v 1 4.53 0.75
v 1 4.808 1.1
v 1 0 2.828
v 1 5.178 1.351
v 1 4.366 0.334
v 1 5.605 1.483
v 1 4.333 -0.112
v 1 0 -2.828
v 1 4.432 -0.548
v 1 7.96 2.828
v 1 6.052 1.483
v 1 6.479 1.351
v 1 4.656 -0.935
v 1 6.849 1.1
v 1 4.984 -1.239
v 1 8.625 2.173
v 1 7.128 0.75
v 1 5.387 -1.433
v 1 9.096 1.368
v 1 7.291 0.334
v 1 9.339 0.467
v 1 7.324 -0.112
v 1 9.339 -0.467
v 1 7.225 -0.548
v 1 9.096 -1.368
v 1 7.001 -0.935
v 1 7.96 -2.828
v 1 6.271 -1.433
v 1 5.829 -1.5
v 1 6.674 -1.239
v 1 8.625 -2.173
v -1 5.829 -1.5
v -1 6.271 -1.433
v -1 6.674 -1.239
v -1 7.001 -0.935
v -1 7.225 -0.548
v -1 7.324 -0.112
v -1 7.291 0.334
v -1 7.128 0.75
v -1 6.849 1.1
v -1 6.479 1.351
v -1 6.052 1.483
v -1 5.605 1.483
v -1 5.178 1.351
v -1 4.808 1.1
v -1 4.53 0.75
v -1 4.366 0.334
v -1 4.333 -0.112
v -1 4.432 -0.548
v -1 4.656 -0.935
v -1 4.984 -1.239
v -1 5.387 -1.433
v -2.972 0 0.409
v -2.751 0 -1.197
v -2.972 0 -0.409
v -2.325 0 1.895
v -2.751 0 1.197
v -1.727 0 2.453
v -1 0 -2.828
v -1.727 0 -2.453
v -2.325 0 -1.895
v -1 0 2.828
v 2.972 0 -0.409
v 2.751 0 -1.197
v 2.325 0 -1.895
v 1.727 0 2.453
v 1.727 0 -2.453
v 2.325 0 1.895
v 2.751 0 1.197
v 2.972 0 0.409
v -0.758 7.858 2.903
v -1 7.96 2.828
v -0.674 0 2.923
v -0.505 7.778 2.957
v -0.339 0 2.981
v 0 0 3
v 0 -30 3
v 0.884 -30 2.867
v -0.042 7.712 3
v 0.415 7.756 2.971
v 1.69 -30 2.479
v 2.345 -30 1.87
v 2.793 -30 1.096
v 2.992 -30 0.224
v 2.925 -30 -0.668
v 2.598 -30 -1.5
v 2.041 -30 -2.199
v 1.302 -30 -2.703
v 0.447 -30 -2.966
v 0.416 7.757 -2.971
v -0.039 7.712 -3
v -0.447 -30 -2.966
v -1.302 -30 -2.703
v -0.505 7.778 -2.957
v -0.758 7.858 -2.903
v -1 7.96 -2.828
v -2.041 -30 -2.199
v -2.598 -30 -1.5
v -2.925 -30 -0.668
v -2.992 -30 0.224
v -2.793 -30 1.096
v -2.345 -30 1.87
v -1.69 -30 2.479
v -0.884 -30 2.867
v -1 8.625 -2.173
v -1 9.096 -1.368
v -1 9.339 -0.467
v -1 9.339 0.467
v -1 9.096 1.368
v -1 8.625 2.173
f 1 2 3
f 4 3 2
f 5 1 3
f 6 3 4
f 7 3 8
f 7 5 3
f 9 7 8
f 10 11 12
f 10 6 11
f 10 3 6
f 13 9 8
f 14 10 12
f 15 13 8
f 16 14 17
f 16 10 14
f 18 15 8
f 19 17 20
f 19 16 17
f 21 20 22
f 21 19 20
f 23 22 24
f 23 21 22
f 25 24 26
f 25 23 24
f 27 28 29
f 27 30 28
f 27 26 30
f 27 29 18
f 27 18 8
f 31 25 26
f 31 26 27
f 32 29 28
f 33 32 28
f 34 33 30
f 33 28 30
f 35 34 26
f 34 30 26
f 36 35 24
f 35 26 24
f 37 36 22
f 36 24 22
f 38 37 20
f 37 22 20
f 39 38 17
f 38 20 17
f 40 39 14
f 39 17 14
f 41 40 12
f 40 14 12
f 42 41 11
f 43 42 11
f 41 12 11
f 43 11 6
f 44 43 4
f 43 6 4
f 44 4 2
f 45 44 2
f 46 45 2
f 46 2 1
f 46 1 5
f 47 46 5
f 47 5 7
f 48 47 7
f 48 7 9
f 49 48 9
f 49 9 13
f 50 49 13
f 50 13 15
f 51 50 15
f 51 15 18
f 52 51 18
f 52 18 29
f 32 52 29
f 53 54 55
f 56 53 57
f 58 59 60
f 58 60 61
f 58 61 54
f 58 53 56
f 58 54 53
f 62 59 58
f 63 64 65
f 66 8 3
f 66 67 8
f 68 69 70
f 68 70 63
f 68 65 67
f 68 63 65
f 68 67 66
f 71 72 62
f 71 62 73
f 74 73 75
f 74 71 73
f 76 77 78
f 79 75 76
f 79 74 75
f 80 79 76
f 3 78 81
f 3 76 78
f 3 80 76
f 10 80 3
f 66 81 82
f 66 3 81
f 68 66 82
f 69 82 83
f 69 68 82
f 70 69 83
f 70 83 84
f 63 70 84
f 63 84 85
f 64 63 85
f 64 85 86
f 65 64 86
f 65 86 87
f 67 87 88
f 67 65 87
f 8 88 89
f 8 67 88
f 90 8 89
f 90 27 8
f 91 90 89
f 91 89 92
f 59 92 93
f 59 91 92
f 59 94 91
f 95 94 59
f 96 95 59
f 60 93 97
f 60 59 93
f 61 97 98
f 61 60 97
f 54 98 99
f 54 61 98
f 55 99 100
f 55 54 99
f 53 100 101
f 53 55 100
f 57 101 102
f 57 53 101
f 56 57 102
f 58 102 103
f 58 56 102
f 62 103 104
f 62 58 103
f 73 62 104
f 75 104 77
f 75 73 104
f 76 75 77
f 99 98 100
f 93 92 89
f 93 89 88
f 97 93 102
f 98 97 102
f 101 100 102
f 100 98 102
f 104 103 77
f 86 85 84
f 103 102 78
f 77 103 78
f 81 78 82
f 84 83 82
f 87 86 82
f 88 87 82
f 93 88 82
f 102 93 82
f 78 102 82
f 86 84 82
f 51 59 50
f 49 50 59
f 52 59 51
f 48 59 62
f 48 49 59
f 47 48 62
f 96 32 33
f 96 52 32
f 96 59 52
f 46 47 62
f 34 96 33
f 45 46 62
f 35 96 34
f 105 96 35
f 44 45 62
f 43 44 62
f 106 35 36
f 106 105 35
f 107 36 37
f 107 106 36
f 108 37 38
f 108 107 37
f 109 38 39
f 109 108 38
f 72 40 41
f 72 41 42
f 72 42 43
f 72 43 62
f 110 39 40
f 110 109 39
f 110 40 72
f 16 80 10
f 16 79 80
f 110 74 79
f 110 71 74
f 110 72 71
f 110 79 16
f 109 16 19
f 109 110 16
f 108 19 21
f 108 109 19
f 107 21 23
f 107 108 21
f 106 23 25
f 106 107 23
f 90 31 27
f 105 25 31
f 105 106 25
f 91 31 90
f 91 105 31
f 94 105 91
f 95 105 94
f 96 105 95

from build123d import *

# Parameters (mm, degrees)
SKETCH1_R               = 3
BOSS_EXTRUDE1_DEPTH     = 30
BOSS_EXTRUDE2_START     = 10
BOSS_EXTRUDE2_DEPTH     = 10
SKETCH2_R               = 1.5
CUT_EXTRUDE1_DEPTH      = 10
CUT_EXTRUDE2_DEPTH      = 31.413812651
CUT_EXTRUDE2_DEPTH_BACK = 31.413812651


with BuildPart() as part:
    # Sketch1 → Boss-Extrude1 (new body)
    with BuildSketch(Plane(origin=(0, 0, 0), x_dir=(1, 0, 0), z_dir=(0, 1, 0))):
        Circle(SKETCH1_R)
    extrude(amount=-BOSS_EXTRUDE1_DEPTH)

    # Sketch1<3> → Boss-Extrude2 (add)
    with BuildSketch(Plane(origin=(0, 0, 0), x_dir=(1, 0, 0), z_dir=(0, 1, 0)).offset(BOSS_EXTRUDE2_START)):
        with BuildLine():
            ThreePointArc((-1, -2.828427125), (0, -3), (1, -2.828427125))
            Line((1, -2.828427125), (1, 2.828427125))
            ThreePointArc((1, 2.828427125), (0, 3), (-1, 2.828427125))
            Line((-1, 2.828427125), (-1, -2.828427125))
        make_face()
    extrude(amount=-BOSS_EXTRUDE2_DEPTH)

    # Sketch2 → Cut-Extrude1 (cut)
    with BuildSketch(Plane(origin=(1, 0, 0), x_dir=(0, 0, -1), z_dir=(1, 0, 0))):
        with Locations((0, 5.828656685)):
            Circle(SKETCH2_R)
    extrude(amount=-CUT_EXTRUDE1_DEPTH, mode=Mode.SUBTRACT)

    # Sketch3 → Cut-Extrude2 (cut, two sides: drawn at the far end of the back side and taken through both)
    with BuildSketch(Plane(origin=(1, 0, 0), x_dir=(0, 0, -1), z_dir=(1, 0, 0)).offset(-CUT_EXTRUDE2_DEPTH_BACK)):
        with BuildLine():
            Line((3.541708321, 5.828656685), (6.198168723, 5.828656685))
            Line((6.198168723, 5.828656685), (6.198168723, 11.427002628))
            Line((6.198168723, 11.427002628), (-4.798582237, 11.427002628))
            Line((-4.798582237, 11.427002628), (-4.798582237, 5.828656685))
            Line((-4.798582237, 5.828656685), (-3.541708321, 5.828656685))
            ThreePointArc((-3.541708321, 5.828656685), (0, 9.370365006), (3.541708321, 5.828656685))
        make_face()
    extrude(amount=CUT_EXTRUDE2_DEPTH + CUT_EXTRUDE2_DEPTH_BACK, mode=Mode.SUBTRACT)


solid = part.part
